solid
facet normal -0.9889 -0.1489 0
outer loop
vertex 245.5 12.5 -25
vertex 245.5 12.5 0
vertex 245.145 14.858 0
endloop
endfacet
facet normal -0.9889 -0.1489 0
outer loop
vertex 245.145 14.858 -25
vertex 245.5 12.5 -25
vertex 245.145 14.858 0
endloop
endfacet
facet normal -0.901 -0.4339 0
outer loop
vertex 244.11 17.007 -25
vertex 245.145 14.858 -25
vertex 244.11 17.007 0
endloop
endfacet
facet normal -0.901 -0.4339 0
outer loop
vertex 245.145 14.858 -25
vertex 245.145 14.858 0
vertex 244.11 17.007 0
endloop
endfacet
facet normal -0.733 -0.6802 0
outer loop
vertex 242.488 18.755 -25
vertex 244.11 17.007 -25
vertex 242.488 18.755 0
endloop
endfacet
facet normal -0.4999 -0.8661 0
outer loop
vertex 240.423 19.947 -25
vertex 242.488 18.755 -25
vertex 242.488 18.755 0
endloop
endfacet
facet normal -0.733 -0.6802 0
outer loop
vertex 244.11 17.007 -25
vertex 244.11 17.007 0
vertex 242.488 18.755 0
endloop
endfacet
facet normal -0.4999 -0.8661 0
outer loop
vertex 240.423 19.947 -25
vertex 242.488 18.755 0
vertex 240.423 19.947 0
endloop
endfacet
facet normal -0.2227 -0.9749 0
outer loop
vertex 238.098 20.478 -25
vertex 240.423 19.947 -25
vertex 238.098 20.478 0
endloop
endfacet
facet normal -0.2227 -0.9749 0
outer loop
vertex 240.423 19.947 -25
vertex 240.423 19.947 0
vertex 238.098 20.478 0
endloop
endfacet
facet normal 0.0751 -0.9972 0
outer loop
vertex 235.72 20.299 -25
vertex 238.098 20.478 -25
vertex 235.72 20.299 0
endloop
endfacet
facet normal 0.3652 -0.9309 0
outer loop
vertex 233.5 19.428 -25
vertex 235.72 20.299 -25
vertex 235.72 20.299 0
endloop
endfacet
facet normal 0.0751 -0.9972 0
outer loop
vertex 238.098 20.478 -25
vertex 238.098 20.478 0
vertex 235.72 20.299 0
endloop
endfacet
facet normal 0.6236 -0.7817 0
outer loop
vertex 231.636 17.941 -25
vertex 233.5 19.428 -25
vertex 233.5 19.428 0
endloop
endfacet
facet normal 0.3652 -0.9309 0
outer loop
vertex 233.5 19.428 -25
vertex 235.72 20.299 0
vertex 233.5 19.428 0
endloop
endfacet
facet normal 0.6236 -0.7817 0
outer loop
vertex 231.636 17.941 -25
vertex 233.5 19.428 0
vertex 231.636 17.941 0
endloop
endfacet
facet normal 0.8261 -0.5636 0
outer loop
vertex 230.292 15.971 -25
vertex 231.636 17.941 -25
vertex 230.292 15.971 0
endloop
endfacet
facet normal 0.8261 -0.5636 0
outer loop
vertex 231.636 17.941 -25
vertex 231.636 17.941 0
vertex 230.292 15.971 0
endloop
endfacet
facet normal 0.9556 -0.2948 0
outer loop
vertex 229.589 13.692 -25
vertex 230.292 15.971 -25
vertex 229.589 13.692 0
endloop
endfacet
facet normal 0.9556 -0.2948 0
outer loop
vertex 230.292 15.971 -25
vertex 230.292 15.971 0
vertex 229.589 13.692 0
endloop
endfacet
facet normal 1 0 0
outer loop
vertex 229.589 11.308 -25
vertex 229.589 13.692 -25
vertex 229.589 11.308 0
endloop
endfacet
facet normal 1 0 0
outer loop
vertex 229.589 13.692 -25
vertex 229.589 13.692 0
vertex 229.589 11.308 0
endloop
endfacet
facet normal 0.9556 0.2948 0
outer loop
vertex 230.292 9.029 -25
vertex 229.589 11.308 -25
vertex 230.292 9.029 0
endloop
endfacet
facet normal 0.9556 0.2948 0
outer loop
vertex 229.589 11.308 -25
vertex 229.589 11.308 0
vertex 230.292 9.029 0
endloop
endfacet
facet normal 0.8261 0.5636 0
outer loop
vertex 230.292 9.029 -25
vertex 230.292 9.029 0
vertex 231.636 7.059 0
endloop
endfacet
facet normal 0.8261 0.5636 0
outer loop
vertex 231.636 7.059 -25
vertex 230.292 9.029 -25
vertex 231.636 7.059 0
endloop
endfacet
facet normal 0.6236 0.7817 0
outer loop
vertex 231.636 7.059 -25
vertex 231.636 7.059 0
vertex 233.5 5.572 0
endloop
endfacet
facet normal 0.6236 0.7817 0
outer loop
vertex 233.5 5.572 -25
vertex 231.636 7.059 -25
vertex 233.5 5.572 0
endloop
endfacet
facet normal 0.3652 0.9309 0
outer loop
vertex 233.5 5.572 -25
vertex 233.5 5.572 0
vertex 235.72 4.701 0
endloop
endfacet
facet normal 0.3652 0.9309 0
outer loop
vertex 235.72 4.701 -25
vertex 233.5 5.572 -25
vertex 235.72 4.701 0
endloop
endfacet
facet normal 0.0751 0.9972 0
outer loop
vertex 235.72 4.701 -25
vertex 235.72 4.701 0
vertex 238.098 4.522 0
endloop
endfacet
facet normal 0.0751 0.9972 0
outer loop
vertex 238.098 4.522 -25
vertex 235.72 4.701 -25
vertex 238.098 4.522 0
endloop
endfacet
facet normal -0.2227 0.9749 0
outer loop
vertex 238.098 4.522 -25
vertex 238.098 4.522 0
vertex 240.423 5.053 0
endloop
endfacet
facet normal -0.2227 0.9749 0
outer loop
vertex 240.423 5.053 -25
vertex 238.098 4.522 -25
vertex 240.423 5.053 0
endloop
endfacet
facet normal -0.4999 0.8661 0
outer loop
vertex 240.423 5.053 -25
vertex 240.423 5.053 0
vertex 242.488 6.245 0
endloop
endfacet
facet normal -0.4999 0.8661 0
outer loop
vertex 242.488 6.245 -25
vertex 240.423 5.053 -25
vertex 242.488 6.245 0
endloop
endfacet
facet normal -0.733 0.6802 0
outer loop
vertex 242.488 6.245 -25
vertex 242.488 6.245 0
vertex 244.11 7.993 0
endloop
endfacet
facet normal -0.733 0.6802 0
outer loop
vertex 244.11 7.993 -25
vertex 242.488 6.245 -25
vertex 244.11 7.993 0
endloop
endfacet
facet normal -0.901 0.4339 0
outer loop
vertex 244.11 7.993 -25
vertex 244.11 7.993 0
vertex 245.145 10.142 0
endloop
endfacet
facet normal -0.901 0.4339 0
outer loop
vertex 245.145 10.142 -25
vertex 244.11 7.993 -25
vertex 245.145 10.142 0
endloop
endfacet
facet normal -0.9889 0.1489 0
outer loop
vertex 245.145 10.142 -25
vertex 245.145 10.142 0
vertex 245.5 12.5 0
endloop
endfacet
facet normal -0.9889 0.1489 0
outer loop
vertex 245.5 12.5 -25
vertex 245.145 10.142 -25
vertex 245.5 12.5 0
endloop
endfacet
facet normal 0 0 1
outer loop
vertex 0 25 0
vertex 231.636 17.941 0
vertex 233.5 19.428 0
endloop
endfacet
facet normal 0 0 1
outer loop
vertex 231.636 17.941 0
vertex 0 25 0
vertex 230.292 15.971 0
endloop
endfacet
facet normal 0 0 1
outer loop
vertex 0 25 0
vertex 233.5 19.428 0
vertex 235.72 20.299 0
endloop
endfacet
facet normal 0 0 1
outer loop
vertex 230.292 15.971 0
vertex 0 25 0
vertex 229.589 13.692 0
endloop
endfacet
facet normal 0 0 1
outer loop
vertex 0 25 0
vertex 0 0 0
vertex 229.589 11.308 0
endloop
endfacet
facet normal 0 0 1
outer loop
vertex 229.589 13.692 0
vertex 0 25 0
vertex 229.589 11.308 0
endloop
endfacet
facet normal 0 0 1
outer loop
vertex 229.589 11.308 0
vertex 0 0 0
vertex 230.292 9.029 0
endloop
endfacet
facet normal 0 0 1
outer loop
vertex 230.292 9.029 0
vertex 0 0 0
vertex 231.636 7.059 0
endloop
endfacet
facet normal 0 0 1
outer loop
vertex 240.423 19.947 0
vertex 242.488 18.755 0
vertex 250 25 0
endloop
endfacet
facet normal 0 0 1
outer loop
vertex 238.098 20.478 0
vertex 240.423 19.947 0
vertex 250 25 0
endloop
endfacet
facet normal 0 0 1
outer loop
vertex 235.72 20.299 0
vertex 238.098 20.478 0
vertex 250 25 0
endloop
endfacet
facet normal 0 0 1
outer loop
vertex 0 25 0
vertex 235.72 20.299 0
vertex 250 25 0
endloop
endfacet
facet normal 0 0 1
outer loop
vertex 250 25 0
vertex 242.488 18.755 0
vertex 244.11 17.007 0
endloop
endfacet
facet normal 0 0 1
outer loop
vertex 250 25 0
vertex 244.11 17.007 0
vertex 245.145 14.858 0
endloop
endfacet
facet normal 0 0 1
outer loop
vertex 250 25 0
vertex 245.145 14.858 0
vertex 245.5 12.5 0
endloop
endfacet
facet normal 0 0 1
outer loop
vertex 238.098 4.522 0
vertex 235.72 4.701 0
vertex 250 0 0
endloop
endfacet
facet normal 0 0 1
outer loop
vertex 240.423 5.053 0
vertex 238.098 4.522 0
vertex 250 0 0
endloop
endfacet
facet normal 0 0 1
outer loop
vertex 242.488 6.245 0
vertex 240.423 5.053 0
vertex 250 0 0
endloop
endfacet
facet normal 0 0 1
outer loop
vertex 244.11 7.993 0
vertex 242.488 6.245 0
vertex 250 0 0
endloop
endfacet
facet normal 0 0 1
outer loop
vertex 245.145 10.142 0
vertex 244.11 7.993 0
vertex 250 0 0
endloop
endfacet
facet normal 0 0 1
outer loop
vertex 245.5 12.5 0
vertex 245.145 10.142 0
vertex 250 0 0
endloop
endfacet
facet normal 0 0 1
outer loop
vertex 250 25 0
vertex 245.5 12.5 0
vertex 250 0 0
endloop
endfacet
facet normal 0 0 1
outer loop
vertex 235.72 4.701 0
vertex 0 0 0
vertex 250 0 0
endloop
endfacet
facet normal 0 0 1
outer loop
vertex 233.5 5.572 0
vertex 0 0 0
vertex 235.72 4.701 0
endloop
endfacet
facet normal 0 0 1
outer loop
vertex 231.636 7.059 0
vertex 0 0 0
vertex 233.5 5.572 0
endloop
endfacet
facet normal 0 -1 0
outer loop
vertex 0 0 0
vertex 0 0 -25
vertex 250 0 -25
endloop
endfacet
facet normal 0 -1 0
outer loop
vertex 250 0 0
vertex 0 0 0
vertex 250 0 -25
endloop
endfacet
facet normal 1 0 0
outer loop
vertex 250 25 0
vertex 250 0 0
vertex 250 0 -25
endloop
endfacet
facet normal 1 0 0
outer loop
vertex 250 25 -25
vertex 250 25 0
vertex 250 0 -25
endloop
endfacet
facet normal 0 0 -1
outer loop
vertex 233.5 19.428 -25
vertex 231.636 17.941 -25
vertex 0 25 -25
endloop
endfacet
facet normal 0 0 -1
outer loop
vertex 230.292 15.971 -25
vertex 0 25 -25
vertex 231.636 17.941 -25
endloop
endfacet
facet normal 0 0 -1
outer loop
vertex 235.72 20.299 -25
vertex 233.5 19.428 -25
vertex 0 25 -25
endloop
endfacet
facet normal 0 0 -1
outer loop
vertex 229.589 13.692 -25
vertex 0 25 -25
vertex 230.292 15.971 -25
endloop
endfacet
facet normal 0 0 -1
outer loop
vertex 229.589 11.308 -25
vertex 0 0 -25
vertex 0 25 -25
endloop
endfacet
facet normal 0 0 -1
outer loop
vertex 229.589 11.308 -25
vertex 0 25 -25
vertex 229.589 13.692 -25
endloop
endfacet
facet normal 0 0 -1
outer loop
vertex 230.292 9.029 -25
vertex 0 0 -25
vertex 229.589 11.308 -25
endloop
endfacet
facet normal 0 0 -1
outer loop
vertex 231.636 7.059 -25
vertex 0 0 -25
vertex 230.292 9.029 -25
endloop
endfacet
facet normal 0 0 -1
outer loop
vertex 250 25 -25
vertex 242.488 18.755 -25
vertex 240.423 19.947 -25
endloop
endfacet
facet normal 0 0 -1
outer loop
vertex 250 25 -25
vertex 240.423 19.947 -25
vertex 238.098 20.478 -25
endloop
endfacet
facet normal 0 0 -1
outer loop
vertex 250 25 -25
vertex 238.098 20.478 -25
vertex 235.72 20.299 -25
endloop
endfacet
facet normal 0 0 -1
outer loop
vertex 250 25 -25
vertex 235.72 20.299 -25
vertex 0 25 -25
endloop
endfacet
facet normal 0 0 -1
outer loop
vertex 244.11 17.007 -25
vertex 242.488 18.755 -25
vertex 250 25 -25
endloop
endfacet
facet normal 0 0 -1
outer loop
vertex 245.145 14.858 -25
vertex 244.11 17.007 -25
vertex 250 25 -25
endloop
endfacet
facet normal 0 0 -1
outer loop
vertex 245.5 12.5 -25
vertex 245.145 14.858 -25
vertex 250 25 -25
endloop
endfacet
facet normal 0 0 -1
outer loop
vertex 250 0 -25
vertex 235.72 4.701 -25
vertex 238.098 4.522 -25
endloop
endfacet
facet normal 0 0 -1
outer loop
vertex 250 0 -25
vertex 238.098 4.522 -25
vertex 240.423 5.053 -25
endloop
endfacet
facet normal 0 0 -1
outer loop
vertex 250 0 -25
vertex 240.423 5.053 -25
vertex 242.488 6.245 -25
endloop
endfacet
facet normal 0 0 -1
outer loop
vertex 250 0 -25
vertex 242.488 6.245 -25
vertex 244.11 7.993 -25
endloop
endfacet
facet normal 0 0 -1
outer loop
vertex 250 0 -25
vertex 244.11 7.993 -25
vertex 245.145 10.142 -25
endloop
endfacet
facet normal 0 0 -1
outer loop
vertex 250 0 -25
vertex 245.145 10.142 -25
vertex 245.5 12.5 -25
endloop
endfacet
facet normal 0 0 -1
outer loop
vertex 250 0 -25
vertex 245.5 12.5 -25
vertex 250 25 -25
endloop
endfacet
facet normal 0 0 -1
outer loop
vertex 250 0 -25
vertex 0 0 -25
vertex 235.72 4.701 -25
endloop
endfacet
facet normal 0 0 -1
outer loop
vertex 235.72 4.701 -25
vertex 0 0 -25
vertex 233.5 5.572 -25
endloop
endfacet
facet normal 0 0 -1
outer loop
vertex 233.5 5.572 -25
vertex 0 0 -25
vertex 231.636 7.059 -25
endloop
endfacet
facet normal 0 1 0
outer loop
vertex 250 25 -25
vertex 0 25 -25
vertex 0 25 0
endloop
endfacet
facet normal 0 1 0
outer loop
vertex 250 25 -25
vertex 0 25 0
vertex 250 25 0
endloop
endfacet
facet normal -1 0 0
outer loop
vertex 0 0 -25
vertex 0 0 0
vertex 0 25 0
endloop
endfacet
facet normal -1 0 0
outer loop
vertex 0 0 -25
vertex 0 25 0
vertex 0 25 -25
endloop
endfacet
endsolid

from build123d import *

# Parameters (mm, degrees)
SKETCH1_W           = 250
SKETCH1_H           = 25
BOSS_EXTRUDE1_DEPTH = 25
SKETCH2_R           = 8
CUT_EXTRUDE1_DEPTH  = 26


with BuildPart() as part:
    # Sketch1 → Boss-Extrude1 (new body)
    with BuildSketch(Plane(origin=(0, 0, 0), x_dir=(1, 0, 0), z_dir=(0, 1, 0))):
        with Locations((125, 12.5)):
            Rectangle(SKETCH1_W, SKETCH1_H)
    extrude(amount=BOSS_EXTRUDE1_DEPTH)

    # Sketch2 → Cut-Extrude1 (cut, through all)
    with BuildSketch(Plane.XY):
        with Locations((237.5, 12.5)):
            Circle(SKETCH2_R)
    extrude(amount=-CUT_EXTRUDE1_DEPTH, mode=Mode.SUBTRACT)


solid = part.part
